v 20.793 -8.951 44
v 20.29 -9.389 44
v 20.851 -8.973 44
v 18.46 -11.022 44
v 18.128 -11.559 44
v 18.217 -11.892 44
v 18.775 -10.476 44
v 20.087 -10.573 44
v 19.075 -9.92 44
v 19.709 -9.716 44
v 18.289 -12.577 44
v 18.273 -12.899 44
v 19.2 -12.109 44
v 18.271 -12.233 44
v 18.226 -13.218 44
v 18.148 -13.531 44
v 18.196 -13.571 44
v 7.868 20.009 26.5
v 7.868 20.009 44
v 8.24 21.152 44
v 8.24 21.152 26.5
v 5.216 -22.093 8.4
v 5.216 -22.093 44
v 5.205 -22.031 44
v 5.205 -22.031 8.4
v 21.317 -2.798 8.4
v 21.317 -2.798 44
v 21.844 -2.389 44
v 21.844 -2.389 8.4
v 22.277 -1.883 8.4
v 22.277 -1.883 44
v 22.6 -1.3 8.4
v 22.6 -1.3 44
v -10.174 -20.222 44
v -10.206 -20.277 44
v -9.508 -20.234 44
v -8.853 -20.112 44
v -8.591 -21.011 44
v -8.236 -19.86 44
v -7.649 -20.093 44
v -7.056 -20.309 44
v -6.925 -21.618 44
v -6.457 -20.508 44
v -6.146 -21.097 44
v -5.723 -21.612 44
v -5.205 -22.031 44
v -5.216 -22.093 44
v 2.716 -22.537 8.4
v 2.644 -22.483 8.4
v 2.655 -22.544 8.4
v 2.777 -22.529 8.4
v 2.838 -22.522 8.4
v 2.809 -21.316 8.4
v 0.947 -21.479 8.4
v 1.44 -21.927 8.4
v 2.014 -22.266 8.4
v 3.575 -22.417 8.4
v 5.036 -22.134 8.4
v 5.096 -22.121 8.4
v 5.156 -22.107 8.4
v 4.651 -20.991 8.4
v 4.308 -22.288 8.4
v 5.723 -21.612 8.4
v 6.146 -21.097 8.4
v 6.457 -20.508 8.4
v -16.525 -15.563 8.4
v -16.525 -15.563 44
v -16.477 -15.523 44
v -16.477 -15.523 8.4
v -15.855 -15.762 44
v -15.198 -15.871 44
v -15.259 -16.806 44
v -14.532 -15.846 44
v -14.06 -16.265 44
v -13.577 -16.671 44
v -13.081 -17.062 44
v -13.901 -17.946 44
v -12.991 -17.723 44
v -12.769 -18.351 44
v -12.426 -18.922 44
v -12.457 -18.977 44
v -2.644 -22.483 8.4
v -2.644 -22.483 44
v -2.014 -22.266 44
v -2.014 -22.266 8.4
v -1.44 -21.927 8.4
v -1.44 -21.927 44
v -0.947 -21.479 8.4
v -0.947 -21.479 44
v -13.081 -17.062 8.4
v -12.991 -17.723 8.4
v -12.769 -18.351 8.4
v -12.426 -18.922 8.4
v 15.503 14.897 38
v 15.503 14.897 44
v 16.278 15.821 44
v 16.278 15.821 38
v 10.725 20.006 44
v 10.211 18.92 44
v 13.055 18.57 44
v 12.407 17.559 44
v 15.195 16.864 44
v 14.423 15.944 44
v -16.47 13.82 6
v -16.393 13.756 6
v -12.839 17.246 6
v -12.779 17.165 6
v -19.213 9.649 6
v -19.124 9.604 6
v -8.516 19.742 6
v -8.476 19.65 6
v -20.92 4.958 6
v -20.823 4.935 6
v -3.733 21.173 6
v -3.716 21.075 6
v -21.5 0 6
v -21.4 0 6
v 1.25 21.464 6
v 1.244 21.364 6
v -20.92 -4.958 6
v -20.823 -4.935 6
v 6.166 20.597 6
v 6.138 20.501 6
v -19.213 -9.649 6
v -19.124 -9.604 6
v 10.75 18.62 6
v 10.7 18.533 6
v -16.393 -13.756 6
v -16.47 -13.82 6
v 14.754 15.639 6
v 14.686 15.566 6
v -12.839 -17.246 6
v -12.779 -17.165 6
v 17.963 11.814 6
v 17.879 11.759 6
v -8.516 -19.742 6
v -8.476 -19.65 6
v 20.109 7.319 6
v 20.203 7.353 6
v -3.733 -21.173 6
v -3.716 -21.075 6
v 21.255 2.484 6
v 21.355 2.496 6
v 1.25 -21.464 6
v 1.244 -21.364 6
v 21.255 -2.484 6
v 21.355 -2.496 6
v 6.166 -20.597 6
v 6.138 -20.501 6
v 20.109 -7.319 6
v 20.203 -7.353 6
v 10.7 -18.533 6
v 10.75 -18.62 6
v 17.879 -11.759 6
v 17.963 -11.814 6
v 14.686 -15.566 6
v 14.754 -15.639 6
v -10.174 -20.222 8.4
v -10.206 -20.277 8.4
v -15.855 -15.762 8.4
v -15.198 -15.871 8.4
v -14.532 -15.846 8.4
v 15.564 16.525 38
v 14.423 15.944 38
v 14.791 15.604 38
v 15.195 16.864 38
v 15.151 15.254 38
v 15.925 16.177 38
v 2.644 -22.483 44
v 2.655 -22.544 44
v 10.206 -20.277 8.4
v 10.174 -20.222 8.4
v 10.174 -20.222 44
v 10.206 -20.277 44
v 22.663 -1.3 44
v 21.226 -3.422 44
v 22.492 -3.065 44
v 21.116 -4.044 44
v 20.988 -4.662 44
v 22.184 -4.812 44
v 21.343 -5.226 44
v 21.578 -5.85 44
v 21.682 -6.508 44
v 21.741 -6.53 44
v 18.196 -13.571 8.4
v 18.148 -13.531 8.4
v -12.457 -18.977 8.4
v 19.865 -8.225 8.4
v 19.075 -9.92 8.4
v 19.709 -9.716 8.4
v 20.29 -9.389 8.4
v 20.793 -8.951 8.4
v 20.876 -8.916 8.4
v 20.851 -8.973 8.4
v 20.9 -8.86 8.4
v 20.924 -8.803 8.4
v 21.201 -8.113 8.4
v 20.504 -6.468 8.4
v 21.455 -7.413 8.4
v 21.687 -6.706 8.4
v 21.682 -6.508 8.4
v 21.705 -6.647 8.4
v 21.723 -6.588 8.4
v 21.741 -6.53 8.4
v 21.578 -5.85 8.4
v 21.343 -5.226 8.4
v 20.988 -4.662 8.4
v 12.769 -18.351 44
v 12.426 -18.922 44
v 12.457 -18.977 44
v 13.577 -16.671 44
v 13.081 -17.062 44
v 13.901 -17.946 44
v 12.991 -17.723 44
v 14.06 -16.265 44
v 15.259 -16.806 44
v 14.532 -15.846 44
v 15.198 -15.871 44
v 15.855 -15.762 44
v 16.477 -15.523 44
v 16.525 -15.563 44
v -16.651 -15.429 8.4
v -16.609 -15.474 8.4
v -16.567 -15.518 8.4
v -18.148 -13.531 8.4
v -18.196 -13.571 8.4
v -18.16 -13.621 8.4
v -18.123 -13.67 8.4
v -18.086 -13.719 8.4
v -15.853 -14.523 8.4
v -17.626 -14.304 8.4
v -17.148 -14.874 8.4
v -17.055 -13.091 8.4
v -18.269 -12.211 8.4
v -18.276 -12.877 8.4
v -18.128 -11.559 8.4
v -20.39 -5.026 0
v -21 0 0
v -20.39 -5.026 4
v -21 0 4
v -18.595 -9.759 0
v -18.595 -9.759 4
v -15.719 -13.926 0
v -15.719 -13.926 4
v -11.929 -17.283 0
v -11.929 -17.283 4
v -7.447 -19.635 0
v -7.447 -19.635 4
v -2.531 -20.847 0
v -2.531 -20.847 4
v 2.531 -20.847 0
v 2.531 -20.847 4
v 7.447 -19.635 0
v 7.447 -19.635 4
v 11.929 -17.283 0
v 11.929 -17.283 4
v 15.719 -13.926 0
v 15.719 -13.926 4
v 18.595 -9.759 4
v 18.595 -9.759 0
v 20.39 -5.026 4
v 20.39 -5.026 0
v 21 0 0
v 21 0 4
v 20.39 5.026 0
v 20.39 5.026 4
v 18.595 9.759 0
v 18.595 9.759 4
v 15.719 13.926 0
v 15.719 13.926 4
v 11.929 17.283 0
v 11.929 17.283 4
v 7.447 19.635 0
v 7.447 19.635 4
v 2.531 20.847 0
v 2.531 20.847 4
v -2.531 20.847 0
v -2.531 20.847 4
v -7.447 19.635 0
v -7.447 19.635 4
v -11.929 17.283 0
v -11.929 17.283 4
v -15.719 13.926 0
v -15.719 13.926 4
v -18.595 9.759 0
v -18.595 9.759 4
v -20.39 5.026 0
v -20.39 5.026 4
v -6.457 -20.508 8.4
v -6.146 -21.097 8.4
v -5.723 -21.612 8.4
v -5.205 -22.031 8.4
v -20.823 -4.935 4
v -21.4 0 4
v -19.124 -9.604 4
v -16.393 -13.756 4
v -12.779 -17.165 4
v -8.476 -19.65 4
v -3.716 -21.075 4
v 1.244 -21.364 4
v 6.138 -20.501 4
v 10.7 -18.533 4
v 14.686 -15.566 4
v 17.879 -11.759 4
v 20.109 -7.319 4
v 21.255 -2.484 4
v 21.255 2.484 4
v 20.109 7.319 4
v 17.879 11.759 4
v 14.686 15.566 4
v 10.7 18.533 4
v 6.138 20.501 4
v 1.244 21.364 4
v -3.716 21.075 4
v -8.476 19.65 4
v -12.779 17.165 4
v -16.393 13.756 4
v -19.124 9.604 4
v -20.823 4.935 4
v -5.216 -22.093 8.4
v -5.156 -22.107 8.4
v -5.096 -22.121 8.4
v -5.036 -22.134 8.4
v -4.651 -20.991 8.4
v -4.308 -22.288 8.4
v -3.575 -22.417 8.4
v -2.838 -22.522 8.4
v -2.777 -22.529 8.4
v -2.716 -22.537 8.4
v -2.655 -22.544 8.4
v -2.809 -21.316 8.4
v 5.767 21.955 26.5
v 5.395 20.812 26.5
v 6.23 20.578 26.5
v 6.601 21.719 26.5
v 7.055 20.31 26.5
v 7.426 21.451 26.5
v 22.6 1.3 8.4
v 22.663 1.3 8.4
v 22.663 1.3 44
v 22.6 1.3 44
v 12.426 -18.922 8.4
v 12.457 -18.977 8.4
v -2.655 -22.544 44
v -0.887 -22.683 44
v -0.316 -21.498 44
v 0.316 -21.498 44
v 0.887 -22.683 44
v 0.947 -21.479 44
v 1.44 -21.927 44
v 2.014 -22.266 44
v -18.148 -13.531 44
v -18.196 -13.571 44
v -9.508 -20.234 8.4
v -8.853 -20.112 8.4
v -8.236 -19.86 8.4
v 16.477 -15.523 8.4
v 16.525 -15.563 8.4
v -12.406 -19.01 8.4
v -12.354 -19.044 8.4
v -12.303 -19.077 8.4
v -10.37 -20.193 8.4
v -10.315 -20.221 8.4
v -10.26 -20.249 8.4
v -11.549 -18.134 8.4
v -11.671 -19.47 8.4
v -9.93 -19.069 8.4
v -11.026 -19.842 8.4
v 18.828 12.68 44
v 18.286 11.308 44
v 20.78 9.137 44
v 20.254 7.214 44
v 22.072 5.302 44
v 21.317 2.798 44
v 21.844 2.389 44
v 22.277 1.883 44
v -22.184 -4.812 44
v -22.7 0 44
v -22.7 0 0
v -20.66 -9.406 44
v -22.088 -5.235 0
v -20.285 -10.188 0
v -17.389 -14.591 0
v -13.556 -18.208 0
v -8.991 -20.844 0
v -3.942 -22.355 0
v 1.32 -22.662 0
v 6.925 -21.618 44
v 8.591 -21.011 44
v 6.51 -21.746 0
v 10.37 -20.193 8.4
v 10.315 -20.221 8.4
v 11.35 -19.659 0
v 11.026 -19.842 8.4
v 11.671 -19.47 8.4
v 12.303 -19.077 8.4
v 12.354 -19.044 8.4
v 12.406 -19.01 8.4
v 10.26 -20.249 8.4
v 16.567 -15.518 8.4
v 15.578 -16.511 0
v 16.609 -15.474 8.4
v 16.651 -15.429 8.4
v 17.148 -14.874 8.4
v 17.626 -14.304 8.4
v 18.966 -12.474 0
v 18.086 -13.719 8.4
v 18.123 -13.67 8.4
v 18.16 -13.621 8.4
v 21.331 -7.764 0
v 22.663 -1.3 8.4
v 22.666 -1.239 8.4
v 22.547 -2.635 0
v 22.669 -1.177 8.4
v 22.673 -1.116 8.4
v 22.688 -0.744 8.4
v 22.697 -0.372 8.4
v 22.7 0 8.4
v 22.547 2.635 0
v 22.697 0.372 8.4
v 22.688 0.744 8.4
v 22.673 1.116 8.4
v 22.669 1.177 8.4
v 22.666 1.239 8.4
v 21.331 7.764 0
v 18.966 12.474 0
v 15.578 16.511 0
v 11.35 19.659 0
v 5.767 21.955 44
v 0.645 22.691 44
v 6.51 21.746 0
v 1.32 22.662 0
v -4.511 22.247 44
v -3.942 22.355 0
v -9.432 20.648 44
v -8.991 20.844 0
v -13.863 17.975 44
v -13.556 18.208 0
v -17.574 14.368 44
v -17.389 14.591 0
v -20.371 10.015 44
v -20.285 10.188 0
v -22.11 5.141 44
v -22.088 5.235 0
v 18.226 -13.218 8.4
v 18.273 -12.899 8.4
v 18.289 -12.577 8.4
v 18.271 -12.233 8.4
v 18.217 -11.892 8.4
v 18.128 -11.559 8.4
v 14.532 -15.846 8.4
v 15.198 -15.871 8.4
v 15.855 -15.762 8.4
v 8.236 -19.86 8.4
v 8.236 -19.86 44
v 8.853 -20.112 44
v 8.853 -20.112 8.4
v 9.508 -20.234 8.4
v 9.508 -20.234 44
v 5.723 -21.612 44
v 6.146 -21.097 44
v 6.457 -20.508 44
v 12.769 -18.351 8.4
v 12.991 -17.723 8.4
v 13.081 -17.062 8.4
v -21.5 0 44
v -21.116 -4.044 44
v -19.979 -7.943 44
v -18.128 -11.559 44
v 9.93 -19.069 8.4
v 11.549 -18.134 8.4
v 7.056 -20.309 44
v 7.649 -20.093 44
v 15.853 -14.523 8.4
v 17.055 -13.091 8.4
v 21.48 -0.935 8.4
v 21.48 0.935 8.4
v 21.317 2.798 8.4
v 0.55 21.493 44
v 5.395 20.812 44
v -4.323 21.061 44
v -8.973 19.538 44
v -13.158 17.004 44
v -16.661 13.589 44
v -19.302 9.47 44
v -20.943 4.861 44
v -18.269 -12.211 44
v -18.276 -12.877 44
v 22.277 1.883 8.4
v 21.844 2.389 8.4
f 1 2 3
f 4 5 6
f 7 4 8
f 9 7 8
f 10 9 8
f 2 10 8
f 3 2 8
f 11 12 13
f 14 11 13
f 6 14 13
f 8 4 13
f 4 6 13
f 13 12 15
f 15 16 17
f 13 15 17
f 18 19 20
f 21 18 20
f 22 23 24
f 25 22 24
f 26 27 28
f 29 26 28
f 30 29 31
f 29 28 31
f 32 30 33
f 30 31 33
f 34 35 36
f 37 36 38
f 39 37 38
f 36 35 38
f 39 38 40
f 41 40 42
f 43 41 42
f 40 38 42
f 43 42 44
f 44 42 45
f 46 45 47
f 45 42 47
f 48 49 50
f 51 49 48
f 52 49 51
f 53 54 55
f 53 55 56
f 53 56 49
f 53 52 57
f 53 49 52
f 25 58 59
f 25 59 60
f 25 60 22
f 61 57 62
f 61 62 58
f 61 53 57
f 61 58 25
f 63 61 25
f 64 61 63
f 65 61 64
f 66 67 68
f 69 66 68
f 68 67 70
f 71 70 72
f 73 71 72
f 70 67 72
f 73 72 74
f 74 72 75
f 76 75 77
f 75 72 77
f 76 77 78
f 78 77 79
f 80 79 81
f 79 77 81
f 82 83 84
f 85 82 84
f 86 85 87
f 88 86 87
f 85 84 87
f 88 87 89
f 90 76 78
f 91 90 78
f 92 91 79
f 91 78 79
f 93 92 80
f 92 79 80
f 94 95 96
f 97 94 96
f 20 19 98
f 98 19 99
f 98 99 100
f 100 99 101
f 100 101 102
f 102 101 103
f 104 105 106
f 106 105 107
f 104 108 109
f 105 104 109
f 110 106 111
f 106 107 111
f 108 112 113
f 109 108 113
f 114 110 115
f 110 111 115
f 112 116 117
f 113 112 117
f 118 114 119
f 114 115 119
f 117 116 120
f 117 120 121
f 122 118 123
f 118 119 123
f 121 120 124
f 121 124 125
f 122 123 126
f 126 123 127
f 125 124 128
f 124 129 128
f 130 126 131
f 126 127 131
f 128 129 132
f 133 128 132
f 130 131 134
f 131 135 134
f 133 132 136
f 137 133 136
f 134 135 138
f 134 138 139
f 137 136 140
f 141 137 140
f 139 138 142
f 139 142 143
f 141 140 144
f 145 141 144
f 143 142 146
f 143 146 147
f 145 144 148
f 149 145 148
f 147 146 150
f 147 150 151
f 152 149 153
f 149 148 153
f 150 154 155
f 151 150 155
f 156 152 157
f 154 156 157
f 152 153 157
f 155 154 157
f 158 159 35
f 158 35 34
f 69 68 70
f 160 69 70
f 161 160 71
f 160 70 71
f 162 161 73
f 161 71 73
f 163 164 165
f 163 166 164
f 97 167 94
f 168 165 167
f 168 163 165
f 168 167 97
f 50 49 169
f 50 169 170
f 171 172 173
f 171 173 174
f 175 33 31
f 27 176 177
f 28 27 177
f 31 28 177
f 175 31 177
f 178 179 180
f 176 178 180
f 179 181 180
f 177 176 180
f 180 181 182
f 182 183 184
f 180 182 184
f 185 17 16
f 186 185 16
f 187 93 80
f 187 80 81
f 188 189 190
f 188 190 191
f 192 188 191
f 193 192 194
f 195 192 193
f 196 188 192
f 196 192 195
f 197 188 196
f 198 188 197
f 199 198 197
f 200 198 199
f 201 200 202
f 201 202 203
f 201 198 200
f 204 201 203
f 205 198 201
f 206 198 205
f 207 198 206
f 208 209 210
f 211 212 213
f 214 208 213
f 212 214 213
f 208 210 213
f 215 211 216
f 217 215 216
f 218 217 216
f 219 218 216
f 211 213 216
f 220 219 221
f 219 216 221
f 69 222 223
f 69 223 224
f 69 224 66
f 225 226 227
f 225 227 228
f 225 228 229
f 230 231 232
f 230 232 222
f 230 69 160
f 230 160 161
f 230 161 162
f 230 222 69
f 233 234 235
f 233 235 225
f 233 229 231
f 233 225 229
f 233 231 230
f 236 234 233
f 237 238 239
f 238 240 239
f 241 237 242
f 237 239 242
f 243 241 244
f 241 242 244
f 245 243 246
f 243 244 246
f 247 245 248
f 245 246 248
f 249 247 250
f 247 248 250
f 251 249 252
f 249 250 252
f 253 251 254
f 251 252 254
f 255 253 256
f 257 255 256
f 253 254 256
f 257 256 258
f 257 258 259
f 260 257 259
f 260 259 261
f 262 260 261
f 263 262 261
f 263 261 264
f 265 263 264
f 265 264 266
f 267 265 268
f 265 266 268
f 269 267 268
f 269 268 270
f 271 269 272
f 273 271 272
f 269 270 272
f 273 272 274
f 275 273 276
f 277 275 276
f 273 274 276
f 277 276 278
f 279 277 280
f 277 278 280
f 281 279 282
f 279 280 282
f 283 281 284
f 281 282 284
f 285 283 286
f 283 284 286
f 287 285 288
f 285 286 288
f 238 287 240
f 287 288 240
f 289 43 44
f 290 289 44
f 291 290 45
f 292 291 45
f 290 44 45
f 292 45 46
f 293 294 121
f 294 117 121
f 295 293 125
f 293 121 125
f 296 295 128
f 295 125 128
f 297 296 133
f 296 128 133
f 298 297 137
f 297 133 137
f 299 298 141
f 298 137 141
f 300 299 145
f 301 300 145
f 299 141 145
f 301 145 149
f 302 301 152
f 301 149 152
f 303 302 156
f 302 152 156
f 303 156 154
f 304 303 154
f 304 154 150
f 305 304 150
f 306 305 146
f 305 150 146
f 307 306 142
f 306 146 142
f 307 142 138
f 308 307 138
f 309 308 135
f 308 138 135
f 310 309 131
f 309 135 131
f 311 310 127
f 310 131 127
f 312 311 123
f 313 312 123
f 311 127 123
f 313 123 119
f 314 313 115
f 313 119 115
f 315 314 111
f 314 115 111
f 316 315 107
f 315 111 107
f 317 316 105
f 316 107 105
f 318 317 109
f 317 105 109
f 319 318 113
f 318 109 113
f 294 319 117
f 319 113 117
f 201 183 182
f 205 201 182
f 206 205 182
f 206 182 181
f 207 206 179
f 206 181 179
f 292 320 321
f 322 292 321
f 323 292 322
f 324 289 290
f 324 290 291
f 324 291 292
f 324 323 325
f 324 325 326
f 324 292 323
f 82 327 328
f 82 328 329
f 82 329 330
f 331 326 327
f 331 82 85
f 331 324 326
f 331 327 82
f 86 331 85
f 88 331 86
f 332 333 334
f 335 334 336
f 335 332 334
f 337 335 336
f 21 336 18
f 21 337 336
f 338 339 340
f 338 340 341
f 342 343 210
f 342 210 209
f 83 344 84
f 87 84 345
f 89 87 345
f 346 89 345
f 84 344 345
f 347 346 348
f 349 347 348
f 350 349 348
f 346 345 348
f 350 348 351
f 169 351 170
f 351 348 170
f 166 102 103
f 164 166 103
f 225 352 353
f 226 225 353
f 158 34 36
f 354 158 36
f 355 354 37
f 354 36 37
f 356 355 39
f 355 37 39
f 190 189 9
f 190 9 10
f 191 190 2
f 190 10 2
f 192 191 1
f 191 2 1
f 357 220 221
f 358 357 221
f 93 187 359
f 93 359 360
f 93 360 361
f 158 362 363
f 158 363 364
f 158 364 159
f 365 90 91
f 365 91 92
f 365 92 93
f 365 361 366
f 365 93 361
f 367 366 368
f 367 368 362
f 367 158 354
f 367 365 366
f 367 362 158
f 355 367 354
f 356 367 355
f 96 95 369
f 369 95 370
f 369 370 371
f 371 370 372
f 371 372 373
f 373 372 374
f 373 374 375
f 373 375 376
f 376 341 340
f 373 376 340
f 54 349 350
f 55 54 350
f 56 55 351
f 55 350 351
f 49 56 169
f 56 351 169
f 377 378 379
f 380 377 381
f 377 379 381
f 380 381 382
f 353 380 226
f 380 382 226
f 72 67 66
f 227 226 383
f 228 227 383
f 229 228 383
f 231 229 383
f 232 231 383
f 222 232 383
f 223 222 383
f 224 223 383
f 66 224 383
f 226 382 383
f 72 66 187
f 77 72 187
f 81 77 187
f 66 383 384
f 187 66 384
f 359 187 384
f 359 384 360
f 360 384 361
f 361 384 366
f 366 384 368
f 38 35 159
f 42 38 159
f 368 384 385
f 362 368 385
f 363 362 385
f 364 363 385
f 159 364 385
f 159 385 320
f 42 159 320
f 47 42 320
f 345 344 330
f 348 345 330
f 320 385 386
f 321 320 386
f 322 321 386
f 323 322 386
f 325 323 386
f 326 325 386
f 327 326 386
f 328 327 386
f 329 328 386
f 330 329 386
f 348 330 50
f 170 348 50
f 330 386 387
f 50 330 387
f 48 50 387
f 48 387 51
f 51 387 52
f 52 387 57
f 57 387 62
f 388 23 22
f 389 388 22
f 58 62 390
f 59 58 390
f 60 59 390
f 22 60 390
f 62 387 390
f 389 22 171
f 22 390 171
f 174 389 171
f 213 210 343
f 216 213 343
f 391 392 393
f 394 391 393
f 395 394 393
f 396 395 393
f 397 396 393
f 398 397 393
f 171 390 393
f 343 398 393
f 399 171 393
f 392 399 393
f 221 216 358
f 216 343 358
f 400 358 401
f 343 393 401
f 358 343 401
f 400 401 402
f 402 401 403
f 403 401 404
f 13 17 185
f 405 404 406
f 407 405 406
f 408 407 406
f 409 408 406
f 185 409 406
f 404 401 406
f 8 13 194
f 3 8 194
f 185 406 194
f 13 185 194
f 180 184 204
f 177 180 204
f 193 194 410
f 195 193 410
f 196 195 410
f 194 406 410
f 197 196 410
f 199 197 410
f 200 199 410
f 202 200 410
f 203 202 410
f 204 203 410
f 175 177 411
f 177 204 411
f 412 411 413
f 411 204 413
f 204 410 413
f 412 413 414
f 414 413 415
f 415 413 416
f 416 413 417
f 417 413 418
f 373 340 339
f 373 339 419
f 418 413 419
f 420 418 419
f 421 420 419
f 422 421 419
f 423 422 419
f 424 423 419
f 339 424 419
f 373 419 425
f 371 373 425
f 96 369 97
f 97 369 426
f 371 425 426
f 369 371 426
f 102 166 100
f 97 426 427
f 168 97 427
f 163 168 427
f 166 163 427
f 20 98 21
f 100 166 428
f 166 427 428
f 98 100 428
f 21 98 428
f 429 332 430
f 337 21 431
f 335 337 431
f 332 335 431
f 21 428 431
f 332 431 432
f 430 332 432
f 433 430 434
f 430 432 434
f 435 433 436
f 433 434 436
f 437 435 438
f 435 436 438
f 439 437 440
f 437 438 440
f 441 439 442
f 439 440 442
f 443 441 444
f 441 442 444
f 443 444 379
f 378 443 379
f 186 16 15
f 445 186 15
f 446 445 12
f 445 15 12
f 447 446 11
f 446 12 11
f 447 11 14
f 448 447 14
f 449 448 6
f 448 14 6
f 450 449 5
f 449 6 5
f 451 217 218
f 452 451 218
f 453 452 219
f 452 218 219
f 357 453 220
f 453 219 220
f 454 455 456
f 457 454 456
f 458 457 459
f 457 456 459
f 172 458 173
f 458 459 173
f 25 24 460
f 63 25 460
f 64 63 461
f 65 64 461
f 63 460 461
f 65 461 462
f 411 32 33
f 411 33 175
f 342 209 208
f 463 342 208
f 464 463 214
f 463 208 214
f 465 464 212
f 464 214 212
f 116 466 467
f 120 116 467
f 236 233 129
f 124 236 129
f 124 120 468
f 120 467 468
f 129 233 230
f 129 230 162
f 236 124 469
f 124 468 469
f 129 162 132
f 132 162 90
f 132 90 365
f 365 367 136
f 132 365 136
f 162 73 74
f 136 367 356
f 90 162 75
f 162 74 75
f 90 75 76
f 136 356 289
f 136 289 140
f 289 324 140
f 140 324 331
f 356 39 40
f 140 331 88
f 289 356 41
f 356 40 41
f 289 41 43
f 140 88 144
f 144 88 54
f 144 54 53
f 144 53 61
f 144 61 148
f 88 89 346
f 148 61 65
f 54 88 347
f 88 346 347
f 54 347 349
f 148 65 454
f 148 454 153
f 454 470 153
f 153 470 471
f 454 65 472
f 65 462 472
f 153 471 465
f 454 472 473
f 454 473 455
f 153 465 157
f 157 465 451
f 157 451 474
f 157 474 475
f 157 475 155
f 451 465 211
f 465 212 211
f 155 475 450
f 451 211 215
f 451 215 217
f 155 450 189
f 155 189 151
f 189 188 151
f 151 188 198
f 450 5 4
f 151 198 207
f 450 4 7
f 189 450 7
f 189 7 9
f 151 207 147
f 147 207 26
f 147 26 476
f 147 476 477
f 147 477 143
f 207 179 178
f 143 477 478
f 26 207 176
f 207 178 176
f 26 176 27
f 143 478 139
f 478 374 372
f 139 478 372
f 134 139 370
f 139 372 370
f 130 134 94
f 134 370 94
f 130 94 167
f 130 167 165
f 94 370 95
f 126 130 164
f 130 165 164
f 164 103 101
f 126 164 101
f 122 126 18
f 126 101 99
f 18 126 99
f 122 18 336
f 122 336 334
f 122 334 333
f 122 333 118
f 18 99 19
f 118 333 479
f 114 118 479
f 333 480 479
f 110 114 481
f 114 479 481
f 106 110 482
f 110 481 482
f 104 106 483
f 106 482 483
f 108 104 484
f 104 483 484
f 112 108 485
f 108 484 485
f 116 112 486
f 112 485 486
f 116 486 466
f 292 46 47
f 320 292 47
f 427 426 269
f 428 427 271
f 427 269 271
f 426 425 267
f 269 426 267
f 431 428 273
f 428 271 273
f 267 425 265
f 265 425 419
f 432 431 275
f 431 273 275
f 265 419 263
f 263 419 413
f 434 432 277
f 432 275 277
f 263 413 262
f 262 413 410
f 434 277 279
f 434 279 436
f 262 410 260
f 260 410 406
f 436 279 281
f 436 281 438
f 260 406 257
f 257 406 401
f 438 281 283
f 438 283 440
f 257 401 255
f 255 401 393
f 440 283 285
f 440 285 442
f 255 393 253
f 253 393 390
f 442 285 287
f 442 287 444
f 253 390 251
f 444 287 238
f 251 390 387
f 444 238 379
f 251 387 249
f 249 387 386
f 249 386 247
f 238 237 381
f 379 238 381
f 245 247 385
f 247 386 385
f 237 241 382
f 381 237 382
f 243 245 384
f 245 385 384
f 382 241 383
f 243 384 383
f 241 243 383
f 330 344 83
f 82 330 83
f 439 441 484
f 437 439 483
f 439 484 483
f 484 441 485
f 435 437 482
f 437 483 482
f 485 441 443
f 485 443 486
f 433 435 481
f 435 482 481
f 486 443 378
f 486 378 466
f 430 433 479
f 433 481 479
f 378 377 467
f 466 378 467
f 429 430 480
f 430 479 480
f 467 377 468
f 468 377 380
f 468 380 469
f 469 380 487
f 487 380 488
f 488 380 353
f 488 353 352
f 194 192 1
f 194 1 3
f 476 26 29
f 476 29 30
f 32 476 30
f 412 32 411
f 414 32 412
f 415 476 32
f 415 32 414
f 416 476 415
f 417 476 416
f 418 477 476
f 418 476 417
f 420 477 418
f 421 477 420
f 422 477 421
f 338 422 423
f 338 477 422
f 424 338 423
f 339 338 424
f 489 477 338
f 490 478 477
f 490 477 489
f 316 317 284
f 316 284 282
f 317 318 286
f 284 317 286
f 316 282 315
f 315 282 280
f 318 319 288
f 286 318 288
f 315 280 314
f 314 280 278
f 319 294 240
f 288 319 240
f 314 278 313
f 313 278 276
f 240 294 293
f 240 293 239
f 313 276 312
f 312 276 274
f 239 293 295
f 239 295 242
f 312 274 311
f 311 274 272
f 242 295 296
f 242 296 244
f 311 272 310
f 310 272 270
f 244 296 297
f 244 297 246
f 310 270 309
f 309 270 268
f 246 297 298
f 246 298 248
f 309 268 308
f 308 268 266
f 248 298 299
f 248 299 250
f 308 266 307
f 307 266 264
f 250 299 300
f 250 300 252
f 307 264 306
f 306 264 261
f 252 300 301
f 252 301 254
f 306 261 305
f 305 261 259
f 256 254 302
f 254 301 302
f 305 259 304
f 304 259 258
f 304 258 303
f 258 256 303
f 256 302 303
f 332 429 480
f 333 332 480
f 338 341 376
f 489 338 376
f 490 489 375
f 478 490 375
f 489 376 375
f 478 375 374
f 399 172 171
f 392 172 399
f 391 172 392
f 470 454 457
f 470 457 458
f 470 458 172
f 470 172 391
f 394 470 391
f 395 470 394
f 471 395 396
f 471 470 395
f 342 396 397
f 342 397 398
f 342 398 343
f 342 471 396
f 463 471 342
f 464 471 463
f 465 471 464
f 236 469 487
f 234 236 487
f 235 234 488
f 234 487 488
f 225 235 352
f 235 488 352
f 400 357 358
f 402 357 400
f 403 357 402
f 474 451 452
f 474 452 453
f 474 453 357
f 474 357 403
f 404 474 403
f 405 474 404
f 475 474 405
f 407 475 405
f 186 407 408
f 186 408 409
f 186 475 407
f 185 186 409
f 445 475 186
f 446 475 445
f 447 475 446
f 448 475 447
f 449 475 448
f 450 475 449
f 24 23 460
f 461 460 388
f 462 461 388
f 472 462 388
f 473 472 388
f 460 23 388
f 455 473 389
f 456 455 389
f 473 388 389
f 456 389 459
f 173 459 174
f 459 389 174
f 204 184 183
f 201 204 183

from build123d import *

# Parameters (mm, degrees)
F3_DEPTH = 35.6
F4_DEPTH = 17.5
F5_DEPTH = 6


with BuildPart() as f1:
    # F0 (on Front) → F1 (revolve)
    with BuildSketch(Plane.XZ):
        Polygon((-22.7, 44), (-22.7, 0), (-21, 0), (-21, 4), (-21.4, 4), (-21.4, 6), (-21.5, 6), (-21.5, 44), align=None)
    revolve(axis=Axis((0, 0, 22), (0, 0, 1)))

    # F2 (on face) → F3 (cut)
    with BuildSketch(Plane.XY.offset(44)):
        with BuildLine():
            ThreePointArc((22.7, 0), (22.6931359339, 0.5581948454), (22.6725478867, 1.1160521149))
            ThreePointArc((22.6725478867, 1.1160521149), (22.637726736, 1.2085682904), (22.6001501776, 1.3))
            Line((22.6001501776, 1.3), (21.460661686, 1.3))
            ThreePointArc((21.460661686, 1.3), (21.4901631712, 0.6502975286), (21.5, 0))
            ThreePointArc((21.5, 0), (21.4901631712, -0.6502975286), (21.460661686, -1.3))
            Line((21.460661686, -1.3), (22.6001501776, -1.3))
            ThreePointArc((22.6001501776, -1.3), (22.637726736, -1.2085682904), (22.6725478867, -1.1160521149))
            ThreePointArc((22.6725478867, -1.1160521149), (22.6931359339, -0.5581948454), (22.7, 0))
        make_face()
        with BuildLine():
            Line((21.460661686, 1.3), (22.6001501776, 1.3))
            ThreePointArc((22.6001501776, 1.3), (22.0731627173, 2.1468927393), (21.3172047069, 2.7976389124))
            ThreePointArc((21.3172047069, 2.7976389124), (21.4020371428, 2.050074667), (21.460661686, 1.3))
        make_face()
        with BuildLine():
            ThreePointArc((22.6001501776, 1.3), (22.637726736, 1.2085682904), (22.6725478867, 1.1160521149))
            ThreePointArc((22.6725478867, 1.1160521149), (22.667832914, 1.2080360014), (22.6627447587, 1.3))
            Line((22.6627447587, 1.3), (22.6001501776, 1.3))
        make_face()
        with BuildLine():
            ThreePointArc((22.6627447587, -1.3), (22.667832914, -1.2080360014), (22.6725478867, -1.1160521149))
            ThreePointArc((22.6725478867, -1.1160521149), (22.637726736, -1.2085682904), (22.6001501776, -1.3))
            Line((22.6001501776, -1.3), (22.6627447587, -1.3))
        make_face()
        with BuildLine():
            ThreePointArc((21.3172047069, -2.7976389124), (22.0731627173, -2.1468927393), (22.6001501776, -1.3))
            Line((22.6001501776, -1.3), (21.460661686, -1.3))
            ThreePointArc((21.460661686, -1.3), (21.4020371428, -2.050074667), (21.3172047069, -2.7976389124))
        make_face()
        with BuildLine():
            ThreePointArc((21.460661686, 1.3), (21.4020371428, 2.050074667), (21.3172047069, 2.7976389124))
            ThreePointArc((21.3172047069, 2.7976389124), (16.267, 0), (21.3172047069, -2.7976389124))
            ThreePointArc((21.3172047069, -2.7976389124), (21.4020371428, -2.050074667), (21.460661686, -1.3))
            ThreePointArc((21.460661686, -1.3), (21.4901631712, -0.6502975286), (21.5, 0))
            ThreePointArc((21.5, 0), (21.4901631712, 0.6502975286), (21.460661686, 1.3))
        make_face()
        with BuildLine():
            ThreePointArc((20.6110516098, -6.1183781787), (20.8125032043, -5.3934877744), (20.9884688206, -4.6619927676))
            ThreePointArc((20.9884688206, -4.6619927676), (15.2859798623, -5.5636416715), (19.0747710971, -9.9198340507))
            ThreePointArc((19.0747710971, -9.9198340507), (19.4101695414, -9.2463678477), (19.7217992372, -8.5615789927))
            ThreePointArc((19.7217992372, -8.5615789927), (20.2033913469, -7.3534330815), (20.6110516098, -6.1183781787))
        make_face()
        with BuildLine():
            ThreePointArc((21.6818205369, -6.5081061959), (21.4762686853, -5.5320470115), (20.9884688206, -4.6619927676))
            ThreePointArc((20.9884688206, -4.6619927676), (20.8125032043, -5.3934877744), (20.6110516098, -6.1183781787))
            Line((20.6110516098, -6.1183781787), (21.6818205369, -6.5081061959))
        make_face()
        with BuildLine():
            ThreePointArc((21.6869655109, -6.6923081445), (21.6856790166, -6.6001712509), (21.6818205369, -6.5081061959))
            Line((21.6818205369, -6.5081061959), (20.6110516098, -6.1183781787))
            ThreePointArc((20.6110516098, -6.1183781787), (20.2033913469, -7.3534330815), (19.7217992372, -8.5615789927))
            Line((19.7217992372, -8.5615789927), (20.7925681642, -8.95130701))
            ThreePointArc((20.7925681642, -8.95130701), (20.8591500653, -8.878241247), (20.9235136393, -8.8032140145))
            ThreePointArc((20.9235136393, -8.8032140145), (21.3310224918, -7.7638572535), (21.6869382479, -6.705722141))
            ThreePointArc((21.6869382479, -6.705722141), (21.6869586952, -6.6990151566), (21.6869655109, -6.6923081445))
        make_face()
        with BuildLine():
            ThreePointArc((19.7217992372, -8.5615789927), (19.4101695414, -9.2463678477), (19.0747710971, -9.9198340507))
            ThreePointArc((19.0747710971, -9.9198340507), (20.0077075605, -9.566885541), (20.7925681642, -8.95130701))
            Line((20.7925681642, -8.95130701), (19.7217992372, -8.5615789927))
        make_face()
        with BuildLine():
            ThreePointArc((21.6869382479, -6.705722141), (21.7139679649, -6.6176729459), (21.7406402029, -6.5295148035))
            Line((21.7406402029, -6.5295148035), (21.6818205369, -6.5081061959))
            ThreePointArc((21.6818205369, -6.5081061959), (21.6856790166, -6.6001712509), (21.6869655109, -6.6923081445))
            ThreePointArc((21.6869655109, -6.6923081445), (21.6869586952, -6.6990151566), (21.6869382479, -6.705722141))
        make_face()
        with BuildLine():
            ThreePointArc((20.8513878302, -8.9727156176), (20.8876226722, -8.8880379783), (20.9235136393, -8.8032140145))
            ThreePointArc((20.9235136393, -8.8032140145), (20.8591500653, -8.878241247), (20.7925681642, -8.95130701))
            Line((20.7925681642, -8.95130701), (20.8513878302, -8.9727156176))
        make_face()
        with BuildLine():
            ThreePointArc((17.2754445228, -12.7987896514), (17.7126742195, -12.1865159908), (18.1282138378, -11.5593193161))
            ThreePointArc((18.1282138378, -11.5593193161), (12.4612449562, -10.4562260468), (14.5316385793, -15.8455508014))
            ThreePointArc((14.5316385793, -15.8455508014), (15.0771490298, -15.327412604), (15.6041967376, -14.7905052035))
            ThreePointArc((15.6041967376, -14.7905052035), (16.4699555271, -13.8199336083), (17.2754445228, -12.7987896514))
        make_face()
        with BuildLine():
            ThreePointArc((18.2891916185, -12.5774251587), (18.248698738, -12.0620482693), (18.1282138378, -11.5593193161))
            ThreePointArc((18.1282138378, -11.5593193161), (17.7126742195, -12.1865159908), (17.2754445228, -12.7987896514))
            Line((17.2754445228, -12.7987896514), (18.1483433498, -13.5312387352))
            ThreePointArc((18.1483433498, -13.5312387352), (18.2537896576, -13.0595036206), (18.2891916185, -12.5774251587))
        make_face()
        with BuildLine():
            Line((18.1483433498, -13.5312387352), (17.2754445228, -12.7987896514))
            ThreePointArc((17.2754445228, -12.7987896514), (16.4699555271, -13.8199336083), (15.6041967376, -14.7905052035))
            Line((15.6041967376, -14.7905052035), (16.4770955646, -15.5229542873))
            ThreePointArc((16.4770955646, -15.5229542873), (16.5646520485, -15.4770672804), (16.6507948488, -15.4285783825))
            ThreePointArc((16.6507948488, -15.4285783825), (17.3892088588, -14.5912787399), (18.0855637912, -13.7186873408))
            ThreePointArc((18.0855637912, -13.7186873408), (18.1183574935, -13.6254332344), (18.1483433498, -13.5312387352))
        make_face()
        with BuildLine():
            ThreePointArc((15.6041967376, -14.7905052035), (15.0771490298, -15.327412604), (14.5316385793, -15.8455508014))
            ThreePointArc((14.5316385793, -15.8455508014), (15.5290275895, -15.8329707542), (16.4770955646, -15.5229542873))
            Line((16.4770955646, -15.5229542873), (15.6041967376, -14.7905052035))
        make_face()
        with BuildLine():
            ThreePointArc((18.0855637912, -13.7186873408), (18.1410780151, -13.6451928696), (18.1962935809, -13.5714737564))
            Line((18.1962935809, -13.5714737564), (18.1483433498, -13.5312387352))
            ThreePointArc((18.1483433498, -13.5312387352), (18.1183574935, -13.6254332344), (18.0855637912, -13.7186873408))
        make_face()
        with BuildLine():
            ThreePointArc((16.6507948488, -15.4285783825), (16.5646520485, -15.4770672804), (16.4770955646, -15.5229542873))
            Line((16.4770955646, -15.5229542873), (16.5250457957, -15.5631893085))
            ThreePointArc((16.5250457957, -15.5631893085), (16.5880568676, -15.4960114016), (16.6507948488, -15.4285783825))
        make_face()
        with BuildLine():
            ThreePointArc((9.6044978181, -19.2354782021), (8.9256018301, -19.5597451919), (8.2357759847, -19.86006027))
            ThreePointArc((8.2357759847, -19.86006027), (9.1773177072, -20.1893660248), (10.1742420639, -20.2223041832))
            Line((10.1742420639, -20.2223041832), (9.6044978181, -19.2354782021))
        make_face()
        with BuildLine():
            ThreePointArc((12.3028034268, -19.076976381), (12.3655142097, -19.0005622922), (12.4259081137, -18.9223041832))
            Line((12.4259081137, -18.9223041832), (11.8561638679, -17.9354782021))
            ThreePointArc((11.8561638679, -17.9354782021), (10.75, -18.6195461814), (9.6044978181, -19.2354782021))
            Line((9.6044978181, -19.2354782021), (10.1742420639, -20.2223041832))
            ThreePointArc((10.1742420639, -20.2223041832), (10.2722125263, -20.2091305825), (10.3697444599, -20.1930284959))
            ThreePointArc((10.3697444599, -20.1930284959), (11.35, -19.6587766659), (12.3028034268, -19.076976381))
        make_face()
        with BuildLine():
            ThreePointArc((12.4259081137, -18.9223041832), (12.8958450101, -18.0424732854), (13.0814287222, -17.0624213577))
            ThreePointArc((13.0814287222, -17.0624213577), (12.4764353126, -17.5096705249), (11.8561638679, -17.9354782021))
            Line((11.8561638679, -17.9354782021), (12.4259081137, -18.9223041832))
        make_face()
        with BuildLine():
            ThreePointArc((11.8561638679, -17.9354782021), (12.4764353126, -17.5096705249), (13.0814287222, -17.0624213577))
            ThreePointArc((13.0814287222, -17.0624213577), (13.0829821399, -17.0039793908), (13.0835, -16.9455190759))
            ThreePointArc((13.0835, -16.9455190759), (8.0831308122, -14.1173138808), (8.2357759847, -19.86006027))
            ThreePointArc((8.2357759847, -19.86006027), (8.9256018301, -19.5597451919), (9.6044978181, -19.2354782021))
            ThreePointArc((9.6044978181, -19.2354782021), (10.75, -18.6195461814), (11.8561638679, -17.9354782021))
        make_face()
        with BuildLine():
            Line((12.4572054043, -18.9765126806), (12.4259081137, -18.9223041832))
            ThreePointArc((12.4259081137, -18.9223041832), (12.3655142097, -19.0005622922), (12.3028034268, -19.076976381))
            ThreePointArc((12.3028034268, -19.076976381), (12.380106323, -19.0269011516), (12.4572054043, -18.9765126806))
        make_face()
        with BuildLine():
            ThreePointArc((10.2055393545, -20.2765126806), (10.2877265911, -20.234937153), (10.3697444599, -20.1930284959))
            ThreePointArc((10.3697444599, -20.1930284959), (10.2722125263, -20.2091305825), (10.1742420639, -20.2223041832))
            Line((10.1742420639, -20.2223041832), (10.2055393545, -20.2765126806))
        make_face()
        with BuildLine():
            ThreePointArc((5.0068548722, -20.9088833822), (5.7353541745, -20.7209003784), (6.4568302413, -20.507543569))
            ThreePointArc((6.4568302413, -20.507543569), (6.6369779576, -19.9002545354), (6.6977738924, -19.2697333032))
            ThreePointArc((6.6977738924, -19.2697333032), (2.2143498115, -16.1892288892), (0.9465572593, -21.4791533668))
            ThreePointArc((0.9465572593, -21.4791533668), (1.6974953219, -21.4328838384), (2.4463547144, -21.3603686441))
            ThreePointArc((2.4463547144, -21.3603686441), (3.7334358198, -21.1733666898), (5.0068548722, -20.9088833822))
        make_face()
        with BuildLine():
            ThreePointArc((2.4463547144, -21.3603686441), (1.6974953219, -21.4328838384), (0.9465572593, -21.4791533668))
            ThreePointArc((0.9465572593, -21.4791533668), (1.7186878666, -22.1106257894), (2.6442248144, -22.4825457451))
            Line((2.6442248144, -22.4825457451), (2.4463547144, -21.3603686441))
        make_face()
        with BuildLine():
            ThreePointArc((5.0361433991, -22.1343005235), (5.1212074167, -22.083943119), (5.2047249723, -22.0310604832))
            Line((5.2047249723, -22.0310604832), (5.0068548722, -20.9088833822))
            ThreePointArc((5.0068548722, -20.9088833822), (3.7334358198, -21.1733666898), (2.4463547144, -21.3603686441))
            Line((2.4463547144, -21.3603686441), (2.6442248144, -22.4825457451))
            ThreePointArc((2.6442248144, -22.4825457451), (2.7407925718, -22.5036744814), (2.8379498481, -22.5219013553))
            ThreePointArc((2.8379498481, -22.5219013553), (3.941813633, -22.3551359934), (5.0361433991, -22.1343005235))
        make_face()
        with BuildLine():
            ThreePointArc((5.2047249723, -22.0310604832), (5.9472410958, -21.3650177657), (6.4568302413, -20.507543569))
            ThreePointArc((6.4568302413, -20.507543569), (5.7353541745, -20.7209003784), (5.0068548722, -20.9088833822))
            Line((5.0068548722, -20.9088833822), (5.2047249723, -22.0310604832))
        make_face()
        with BuildLine():
            Line((5.2155944072, -22.092704112), (5.2047249723, -22.0310604832))
            ThreePointArc((5.2047249723, -22.0310604832), (5.1212074167, -22.083943119), (5.0361433991, -22.1343005235))
            ThreePointArc((5.0361433991, -22.1343005235), (5.1259110973, -22.1136843475), (5.2155944072, -22.092704112))
        make_face()
        with BuildLine():
            ThreePointArc((2.6550942494, -22.5441893739), (2.746544657, -22.5332308479), (2.8379498481, -22.5219013553))
            ThreePointArc((2.8379498481, -22.5219013553), (2.7407925718, -22.5036744814), (2.6442248144, -22.4825457451))
            Line((2.6442248144, -22.4825457451), (2.6550942494, -22.5441893739))
        make_face()
        with BuildLine():
            ThreePointArc((-0.0977738924, -19.2697333032), (-4.0282951246, -16.030529238), (-6.4568302413, -20.507543569))
            ThreePointArc((-6.4568302413, -20.507543569), (-5.7353541745, -20.7209003784), (-5.0068548722, -20.9088833822))
            ThreePointArc((-5.0068548722, -20.9088833822), (-3.7334358198, -21.1733666898), (-2.4463547144, -21.3603686441))
            ThreePointArc((-2.4463547144, -21.3603686441), (-1.6974953219, -21.4328838384), (-0.9465572593, -21.4791533668))
            ThreePointArc((-0.9465572593, -21.4791533668), (-0.3172694784, -20.4531573841), (-0.0977738924, -19.2697333032))
        make_face()
        with BuildLine():
            ThreePointArc((-5.0068548722, -20.9088833822), (-5.7353541745, -20.7209003784), (-6.4568302413, -20.507543569))
            ThreePointArc((-6.4568302413, -20.507543569), (-5.9472410958, -21.3650177657), (-5.2047249723, -22.0310604832))
            Line((-5.2047249723, -22.0310604832), (-5.0068548722, -20.9088833822))
        make_face()
        with BuildLine():
            Line((-5.0068548722, -20.9088833822), (-5.2047249723, -22.0310604832))
            ThreePointArc((-5.2047249723, -22.0310604832), (-5.1212074167, -22.083943119), (-5.0361433991, -22.1343005235))
            ThreePointArc((-5.0361433991, -22.1343005235), (-3.941813633, -22.3551359934), (-2.8379498481, -22.5219013553))
            ThreePointArc((-2.8379498481, -22.5219013553), (-2.7407925718, -22.5036744814), (-2.6442248144, -22.4825457451))
            Line((-2.6442248144, -22.4825457451), (-2.4463547144, -21.3603686441))
            ThreePointArc((-2.4463547144, -21.3603686441), (-3.7334358198, -21.1733666898), (-5.0068548722, -20.9088833822))
        make_face()
        with BuildLine():
            ThreePointArc((-2.6442248144, -22.4825457451), (-1.7186878666, -22.1106257894), (-0.9465572593, -21.4791533668))
            ThreePointArc((-0.9465572593, -21.4791533668), (-1.6974953219, -21.4328838384), (-2.4463547144, -21.3603686441))
            Line((-2.4463547144, -21.3603686441), (-2.6442248144, -22.4825457451))
        make_face()
        with BuildLine():
            Line((-2.6550942494, -22.5441893739), (-2.6442248144, -22.4825457451))
            ThreePointArc((-2.6442248144, -22.4825457451), (-2.7407925718, -22.5036744814), (-2.8379498481, -22.5219013553))
            ThreePointArc((-2.8379498481, -22.5219013553), (-2.746544657, -22.5332308479), (-2.6550942494, -22.5441893739))
        make_face()
        with BuildLine():
            ThreePointArc((-5.0361433991, -22.1343005235), (-5.1212074167, -22.083943119), (-5.2047249723, -22.0310604832))
            Line((-5.2047249723, -22.0310604832), (-5.2155944072, -22.092704112))
            ThreePointArc((-5.2155944072, -22.092704112), (-5.1259110973, -22.1136843475), (-5.0361433991, -22.1343005235))
        make_face()
        with BuildLine():
            ThreePointArc((-6.4835, -16.9455190759), (-9.8419603149, -13.6460369359), (-13.0814287222, -17.0624213577))
            ThreePointArc((-13.0814287222, -17.0624213577), (-12.4764353126, -17.5096705249), (-11.8561638679, -17.9354782021))
            ThreePointArc((-11.8561638679, -17.9354782021), (-10.75, -18.6195461814), (-9.6044978181, -19.2354782021))
            ThreePointArc((-9.6044978181, -19.2354782021), (-8.9256018301, -19.5597451919), (-8.2357759847, -19.86006027))
            ThreePointArc((-8.2357759847, -19.86006027), (-6.955294805, -18.6458882636), (-6.4835, -16.9455190759))
        make_face()
        with BuildLine():
            ThreePointArc((-11.8561638679, -17.9354782021), (-12.4764353126, -17.5096705249), (-13.0814287222, -17.0624213577))
            ThreePointArc((-13.0814287222, -17.0624213577), (-12.8958450101, -18.0424732854), (-12.4259081137, -18.9223041832))
            Line((-12.4259081137, -18.9223041832), (-11.8561638679, -17.9354782021))
        make_face()
        with BuildLine():
            Line((-11.8561638679, -17.9354782021), (-12.4259081137, -18.9223041832))
            ThreePointArc((-12.4259081137, -18.9223041832), (-12.3655142097, -19.0005622922), (-12.3028034268, -19.076976381))
            ThreePointArc((-12.3028034268, -19.076976381), (-11.35, -19.6587766659), (-10.3697444599, -20.1930284959))
            ThreePointArc((-10.3697444599, -20.1930284959), (-10.2722125263, -20.2091305825), (-10.1742420639, -20.2223041832))
            Line((-10.1742420639, -20.2223041832), (-9.6044978181, -19.2354782021))
            ThreePointArc((-9.6044978181, -19.2354782021), (-10.75, -18.6195461814), (-11.8561638679, -17.9354782021))
        make_face()
        with BuildLine():
            ThreePointArc((-10.1742420639, -20.2223041832), (-9.1773177072, -20.1893660248), (-8.2357759847, -19.86006027))
            ThreePointArc((-8.2357759847, -19.86006027), (-8.9256018301, -19.5597451919), (-9.6044978181, -19.2354782021))
            Line((-9.6044978181, -19.2354782021), (-10.1742420639, -20.2223041832))
        make_face()
        with BuildLine():
            ThreePointArc((-10.1742420639, -20.2223041832), (-10.2722125263, -20.2091305825), (-10.3697444599, -20.1930284959))
            ThreePointArc((-10.3697444599, -20.1930284959), (-10.2877265911, -20.234937153), (-10.2055393545, -20.2765126806))
            Line((-10.2055393545, -20.2765126806), (-10.1742420639, -20.2223041832))
        make_face()
        with BuildLine():
            Line((-12.4259081137, -18.9223041832), (-12.4572054043, -18.9765126806))
            ThreePointArc((-12.4572054043, -18.9765126806), (-12.380106323, -19.0269011516), (-12.3028034268, -19.076976381))
            ThreePointArc((-12.3028034268, -19.076976381), (-12.3655142097, -19.0005622922), (-12.4259081137, -18.9223041832))
        make_face()
        with BuildLine():
            ThreePointArc((-11.6891916185, -12.5774251587), (-14.4738147291, -9.3179180393), (-18.1282138378, -11.5593193161))
            ThreePointArc((-18.1282138378, -11.5593193161), (-17.7126742195, -12.1865159908), (-17.2754445228, -12.7987896514))
            ThreePointArc((-17.2754445228, -12.7987896514), (-16.4699555271, -13.8199336083), (-15.6041967376, -14.7905052035))
            ThreePointArc((-15.6041967376, -14.7905052035), (-15.0771490298, -15.327412604), (-14.5316385793, -15.8455508014))
            ThreePointArc((-14.5316385793, -15.8455508014), (-12.4992192262, -14.743074596), (-11.6891916185, -12.5774251587))
        make_face()
        with BuildLine():
            ThreePointArc((-17.2754445228, -12.7987896514), (-17.7126742195, -12.1865159908), (-18.1282138378, -11.5593193161))
            ThreePointArc((-18.1282138378, -11.5593193161), (-18.2890196939, -12.5437402484), (-18.1483433498, -13.5312387352))
            Line((-18.1483433498, -13.5312387352), (-17.2754445228, -12.7987896514))
        make_face()
        with BuildLine():
            Line((-17.2754445228, -12.7987896514), (-18.1483433498, -13.5312387352))
            ThreePointArc((-18.1483433498, -13.5312387352), (-18.1183574935, -13.6254332344), (-18.0855637912, -13.7186873408))
            ThreePointArc((-18.0855637912, -13.7186873408), (-17.3892088588, -14.5912787399), (-16.6507948488, -15.4285783825))
            ThreePointArc((-16.6507948488, -15.4285783825), (-16.5646520485, -15.4770672804), (-16.4770955646, -15.5229542873))
            Line((-16.4770955646, -15.5229542873), (-15.6041967376, -14.7905052035))
            ThreePointArc((-15.6041967376, -14.7905052035), (-16.4699555271, -13.8199336083), (-17.2754445228, -12.7987896514))
        make_face()
        with BuildLine():
            ThreePointArc((-16.4770955646, -15.5229542873), (-15.5290275895, -15.8329707542), (-14.5316385793, -15.8455508014))
            ThreePointArc((-14.5316385793, -15.8455508014), (-15.0771490298, -15.327412604), (-15.6041967376, -14.7905052035))
            Line((-15.6041967376, -14.7905052035), (-16.4770955646, -15.5229542873))
        make_face()
        with BuildLine():
            Line((-18.1483433498, -13.5312387352), (-18.1962935809, -13.5714737564))
            ThreePointArc((-18.1962935809, -13.5714737564), (-18.1410780151, -13.6451928696), (-18.0855637912, -13.7186873408))
            ThreePointArc((-18.0855637912, -13.7186873408), (-18.1183574935, -13.6254332344), (-18.1483433498, -13.5312387352))
        make_face()
        with BuildLine():
            ThreePointArc((-16.4770955646, -15.5229542873), (-16.5646520485, -15.4770672804), (-16.6507948488, -15.4285783825))
            ThreePointArc((-16.6507948488, -15.4285783825), (-16.5880568676, -15.4960114016), (-16.5250457957, -15.5631893085))
            Line((-16.5250457957, -15.5631893085), (-16.4770955646, -15.5229542873))
        make_face()
    extrude(amount=-F3_DEPTH, mode=Mode.SUBTRACT)

    # F2 (on face) → F4 (cut)
    with BuildSketch(Plane.XY.offset(44)):
        with BuildLine():
            Line((7.8680826427, 20.0085800478), (8.2395467408, 21.1518289873))
            ThreePointArc((8.2395467408, 21.1518289873), (7.0146857723, 21.5889829199), (5.7667997985, 21.9552731726))
            Line((5.7667997985, 21.9552731726), (5.3953357003, 20.8120242331))
            ThreePointArc((5.3953357003, 20.8120242331), (6.6438653791, 20.4477151003), (7.8680826427, 20.0085800478))
        make_face()
        with BuildLine():
            Line((7.7132841623, 19.5321593131), (7.8680826427, 20.0085800478))
            ThreePointArc((7.8680826427, 20.0085800478), (6.6438653791, 20.4477151003), (5.3953357003, 20.8120242331))
            Line((5.3953357003, 20.8120242331), (5.2405372199, 20.3356034985))
            ThreePointArc((5.2405372199, 20.3356034985), (6.4893568819, 19.9721868422), (7.7132841623, 19.5321593131))
        make_face()
    extrude(amount=-F4_DEPTH, mode=Mode.SUBTRACT)

    # F2 (on face) → F5 (cut)
    with BuildSketch(Plane.XY.offset(44)):
        with BuildLine():
            Line((15.5025304569, 14.8970315645), (16.2780902413, 15.8213077239))
            ThreePointArc((16.2780902413, 15.8213077239), (15.7452067457, 16.3517113641), (15.1950501559, 16.8641765515))
            Line((15.1950501559, 16.8641765515), (14.4231987776, 15.9443198984))
            ThreePointArc((14.4231987776, 15.9443198984), (14.9720246048, 15.4301159825), (15.5025304569, 14.8970315645))
        make_face()
        with BuildLine():
            Line((15.1792371354, 14.5117455872), (15.5025304569, 14.8970315645))
            ThreePointArc((15.5025304569, 14.8970315645), (14.9720246048, 15.4301159825), (14.4231987776, 15.9443198984))
            Line((14.4231987776, 15.9443198984), (14.1015769428, 15.5610259214))
            ThreePointArc((14.1015769428, 15.5610259214), (14.6498042846, 15.0460371668), (15.1792371354, 14.5117455872))
        make_face()
    extrude(amount=-F5_DEPTH, mode=Mode.SUBTRACT)


solid = f1.part
